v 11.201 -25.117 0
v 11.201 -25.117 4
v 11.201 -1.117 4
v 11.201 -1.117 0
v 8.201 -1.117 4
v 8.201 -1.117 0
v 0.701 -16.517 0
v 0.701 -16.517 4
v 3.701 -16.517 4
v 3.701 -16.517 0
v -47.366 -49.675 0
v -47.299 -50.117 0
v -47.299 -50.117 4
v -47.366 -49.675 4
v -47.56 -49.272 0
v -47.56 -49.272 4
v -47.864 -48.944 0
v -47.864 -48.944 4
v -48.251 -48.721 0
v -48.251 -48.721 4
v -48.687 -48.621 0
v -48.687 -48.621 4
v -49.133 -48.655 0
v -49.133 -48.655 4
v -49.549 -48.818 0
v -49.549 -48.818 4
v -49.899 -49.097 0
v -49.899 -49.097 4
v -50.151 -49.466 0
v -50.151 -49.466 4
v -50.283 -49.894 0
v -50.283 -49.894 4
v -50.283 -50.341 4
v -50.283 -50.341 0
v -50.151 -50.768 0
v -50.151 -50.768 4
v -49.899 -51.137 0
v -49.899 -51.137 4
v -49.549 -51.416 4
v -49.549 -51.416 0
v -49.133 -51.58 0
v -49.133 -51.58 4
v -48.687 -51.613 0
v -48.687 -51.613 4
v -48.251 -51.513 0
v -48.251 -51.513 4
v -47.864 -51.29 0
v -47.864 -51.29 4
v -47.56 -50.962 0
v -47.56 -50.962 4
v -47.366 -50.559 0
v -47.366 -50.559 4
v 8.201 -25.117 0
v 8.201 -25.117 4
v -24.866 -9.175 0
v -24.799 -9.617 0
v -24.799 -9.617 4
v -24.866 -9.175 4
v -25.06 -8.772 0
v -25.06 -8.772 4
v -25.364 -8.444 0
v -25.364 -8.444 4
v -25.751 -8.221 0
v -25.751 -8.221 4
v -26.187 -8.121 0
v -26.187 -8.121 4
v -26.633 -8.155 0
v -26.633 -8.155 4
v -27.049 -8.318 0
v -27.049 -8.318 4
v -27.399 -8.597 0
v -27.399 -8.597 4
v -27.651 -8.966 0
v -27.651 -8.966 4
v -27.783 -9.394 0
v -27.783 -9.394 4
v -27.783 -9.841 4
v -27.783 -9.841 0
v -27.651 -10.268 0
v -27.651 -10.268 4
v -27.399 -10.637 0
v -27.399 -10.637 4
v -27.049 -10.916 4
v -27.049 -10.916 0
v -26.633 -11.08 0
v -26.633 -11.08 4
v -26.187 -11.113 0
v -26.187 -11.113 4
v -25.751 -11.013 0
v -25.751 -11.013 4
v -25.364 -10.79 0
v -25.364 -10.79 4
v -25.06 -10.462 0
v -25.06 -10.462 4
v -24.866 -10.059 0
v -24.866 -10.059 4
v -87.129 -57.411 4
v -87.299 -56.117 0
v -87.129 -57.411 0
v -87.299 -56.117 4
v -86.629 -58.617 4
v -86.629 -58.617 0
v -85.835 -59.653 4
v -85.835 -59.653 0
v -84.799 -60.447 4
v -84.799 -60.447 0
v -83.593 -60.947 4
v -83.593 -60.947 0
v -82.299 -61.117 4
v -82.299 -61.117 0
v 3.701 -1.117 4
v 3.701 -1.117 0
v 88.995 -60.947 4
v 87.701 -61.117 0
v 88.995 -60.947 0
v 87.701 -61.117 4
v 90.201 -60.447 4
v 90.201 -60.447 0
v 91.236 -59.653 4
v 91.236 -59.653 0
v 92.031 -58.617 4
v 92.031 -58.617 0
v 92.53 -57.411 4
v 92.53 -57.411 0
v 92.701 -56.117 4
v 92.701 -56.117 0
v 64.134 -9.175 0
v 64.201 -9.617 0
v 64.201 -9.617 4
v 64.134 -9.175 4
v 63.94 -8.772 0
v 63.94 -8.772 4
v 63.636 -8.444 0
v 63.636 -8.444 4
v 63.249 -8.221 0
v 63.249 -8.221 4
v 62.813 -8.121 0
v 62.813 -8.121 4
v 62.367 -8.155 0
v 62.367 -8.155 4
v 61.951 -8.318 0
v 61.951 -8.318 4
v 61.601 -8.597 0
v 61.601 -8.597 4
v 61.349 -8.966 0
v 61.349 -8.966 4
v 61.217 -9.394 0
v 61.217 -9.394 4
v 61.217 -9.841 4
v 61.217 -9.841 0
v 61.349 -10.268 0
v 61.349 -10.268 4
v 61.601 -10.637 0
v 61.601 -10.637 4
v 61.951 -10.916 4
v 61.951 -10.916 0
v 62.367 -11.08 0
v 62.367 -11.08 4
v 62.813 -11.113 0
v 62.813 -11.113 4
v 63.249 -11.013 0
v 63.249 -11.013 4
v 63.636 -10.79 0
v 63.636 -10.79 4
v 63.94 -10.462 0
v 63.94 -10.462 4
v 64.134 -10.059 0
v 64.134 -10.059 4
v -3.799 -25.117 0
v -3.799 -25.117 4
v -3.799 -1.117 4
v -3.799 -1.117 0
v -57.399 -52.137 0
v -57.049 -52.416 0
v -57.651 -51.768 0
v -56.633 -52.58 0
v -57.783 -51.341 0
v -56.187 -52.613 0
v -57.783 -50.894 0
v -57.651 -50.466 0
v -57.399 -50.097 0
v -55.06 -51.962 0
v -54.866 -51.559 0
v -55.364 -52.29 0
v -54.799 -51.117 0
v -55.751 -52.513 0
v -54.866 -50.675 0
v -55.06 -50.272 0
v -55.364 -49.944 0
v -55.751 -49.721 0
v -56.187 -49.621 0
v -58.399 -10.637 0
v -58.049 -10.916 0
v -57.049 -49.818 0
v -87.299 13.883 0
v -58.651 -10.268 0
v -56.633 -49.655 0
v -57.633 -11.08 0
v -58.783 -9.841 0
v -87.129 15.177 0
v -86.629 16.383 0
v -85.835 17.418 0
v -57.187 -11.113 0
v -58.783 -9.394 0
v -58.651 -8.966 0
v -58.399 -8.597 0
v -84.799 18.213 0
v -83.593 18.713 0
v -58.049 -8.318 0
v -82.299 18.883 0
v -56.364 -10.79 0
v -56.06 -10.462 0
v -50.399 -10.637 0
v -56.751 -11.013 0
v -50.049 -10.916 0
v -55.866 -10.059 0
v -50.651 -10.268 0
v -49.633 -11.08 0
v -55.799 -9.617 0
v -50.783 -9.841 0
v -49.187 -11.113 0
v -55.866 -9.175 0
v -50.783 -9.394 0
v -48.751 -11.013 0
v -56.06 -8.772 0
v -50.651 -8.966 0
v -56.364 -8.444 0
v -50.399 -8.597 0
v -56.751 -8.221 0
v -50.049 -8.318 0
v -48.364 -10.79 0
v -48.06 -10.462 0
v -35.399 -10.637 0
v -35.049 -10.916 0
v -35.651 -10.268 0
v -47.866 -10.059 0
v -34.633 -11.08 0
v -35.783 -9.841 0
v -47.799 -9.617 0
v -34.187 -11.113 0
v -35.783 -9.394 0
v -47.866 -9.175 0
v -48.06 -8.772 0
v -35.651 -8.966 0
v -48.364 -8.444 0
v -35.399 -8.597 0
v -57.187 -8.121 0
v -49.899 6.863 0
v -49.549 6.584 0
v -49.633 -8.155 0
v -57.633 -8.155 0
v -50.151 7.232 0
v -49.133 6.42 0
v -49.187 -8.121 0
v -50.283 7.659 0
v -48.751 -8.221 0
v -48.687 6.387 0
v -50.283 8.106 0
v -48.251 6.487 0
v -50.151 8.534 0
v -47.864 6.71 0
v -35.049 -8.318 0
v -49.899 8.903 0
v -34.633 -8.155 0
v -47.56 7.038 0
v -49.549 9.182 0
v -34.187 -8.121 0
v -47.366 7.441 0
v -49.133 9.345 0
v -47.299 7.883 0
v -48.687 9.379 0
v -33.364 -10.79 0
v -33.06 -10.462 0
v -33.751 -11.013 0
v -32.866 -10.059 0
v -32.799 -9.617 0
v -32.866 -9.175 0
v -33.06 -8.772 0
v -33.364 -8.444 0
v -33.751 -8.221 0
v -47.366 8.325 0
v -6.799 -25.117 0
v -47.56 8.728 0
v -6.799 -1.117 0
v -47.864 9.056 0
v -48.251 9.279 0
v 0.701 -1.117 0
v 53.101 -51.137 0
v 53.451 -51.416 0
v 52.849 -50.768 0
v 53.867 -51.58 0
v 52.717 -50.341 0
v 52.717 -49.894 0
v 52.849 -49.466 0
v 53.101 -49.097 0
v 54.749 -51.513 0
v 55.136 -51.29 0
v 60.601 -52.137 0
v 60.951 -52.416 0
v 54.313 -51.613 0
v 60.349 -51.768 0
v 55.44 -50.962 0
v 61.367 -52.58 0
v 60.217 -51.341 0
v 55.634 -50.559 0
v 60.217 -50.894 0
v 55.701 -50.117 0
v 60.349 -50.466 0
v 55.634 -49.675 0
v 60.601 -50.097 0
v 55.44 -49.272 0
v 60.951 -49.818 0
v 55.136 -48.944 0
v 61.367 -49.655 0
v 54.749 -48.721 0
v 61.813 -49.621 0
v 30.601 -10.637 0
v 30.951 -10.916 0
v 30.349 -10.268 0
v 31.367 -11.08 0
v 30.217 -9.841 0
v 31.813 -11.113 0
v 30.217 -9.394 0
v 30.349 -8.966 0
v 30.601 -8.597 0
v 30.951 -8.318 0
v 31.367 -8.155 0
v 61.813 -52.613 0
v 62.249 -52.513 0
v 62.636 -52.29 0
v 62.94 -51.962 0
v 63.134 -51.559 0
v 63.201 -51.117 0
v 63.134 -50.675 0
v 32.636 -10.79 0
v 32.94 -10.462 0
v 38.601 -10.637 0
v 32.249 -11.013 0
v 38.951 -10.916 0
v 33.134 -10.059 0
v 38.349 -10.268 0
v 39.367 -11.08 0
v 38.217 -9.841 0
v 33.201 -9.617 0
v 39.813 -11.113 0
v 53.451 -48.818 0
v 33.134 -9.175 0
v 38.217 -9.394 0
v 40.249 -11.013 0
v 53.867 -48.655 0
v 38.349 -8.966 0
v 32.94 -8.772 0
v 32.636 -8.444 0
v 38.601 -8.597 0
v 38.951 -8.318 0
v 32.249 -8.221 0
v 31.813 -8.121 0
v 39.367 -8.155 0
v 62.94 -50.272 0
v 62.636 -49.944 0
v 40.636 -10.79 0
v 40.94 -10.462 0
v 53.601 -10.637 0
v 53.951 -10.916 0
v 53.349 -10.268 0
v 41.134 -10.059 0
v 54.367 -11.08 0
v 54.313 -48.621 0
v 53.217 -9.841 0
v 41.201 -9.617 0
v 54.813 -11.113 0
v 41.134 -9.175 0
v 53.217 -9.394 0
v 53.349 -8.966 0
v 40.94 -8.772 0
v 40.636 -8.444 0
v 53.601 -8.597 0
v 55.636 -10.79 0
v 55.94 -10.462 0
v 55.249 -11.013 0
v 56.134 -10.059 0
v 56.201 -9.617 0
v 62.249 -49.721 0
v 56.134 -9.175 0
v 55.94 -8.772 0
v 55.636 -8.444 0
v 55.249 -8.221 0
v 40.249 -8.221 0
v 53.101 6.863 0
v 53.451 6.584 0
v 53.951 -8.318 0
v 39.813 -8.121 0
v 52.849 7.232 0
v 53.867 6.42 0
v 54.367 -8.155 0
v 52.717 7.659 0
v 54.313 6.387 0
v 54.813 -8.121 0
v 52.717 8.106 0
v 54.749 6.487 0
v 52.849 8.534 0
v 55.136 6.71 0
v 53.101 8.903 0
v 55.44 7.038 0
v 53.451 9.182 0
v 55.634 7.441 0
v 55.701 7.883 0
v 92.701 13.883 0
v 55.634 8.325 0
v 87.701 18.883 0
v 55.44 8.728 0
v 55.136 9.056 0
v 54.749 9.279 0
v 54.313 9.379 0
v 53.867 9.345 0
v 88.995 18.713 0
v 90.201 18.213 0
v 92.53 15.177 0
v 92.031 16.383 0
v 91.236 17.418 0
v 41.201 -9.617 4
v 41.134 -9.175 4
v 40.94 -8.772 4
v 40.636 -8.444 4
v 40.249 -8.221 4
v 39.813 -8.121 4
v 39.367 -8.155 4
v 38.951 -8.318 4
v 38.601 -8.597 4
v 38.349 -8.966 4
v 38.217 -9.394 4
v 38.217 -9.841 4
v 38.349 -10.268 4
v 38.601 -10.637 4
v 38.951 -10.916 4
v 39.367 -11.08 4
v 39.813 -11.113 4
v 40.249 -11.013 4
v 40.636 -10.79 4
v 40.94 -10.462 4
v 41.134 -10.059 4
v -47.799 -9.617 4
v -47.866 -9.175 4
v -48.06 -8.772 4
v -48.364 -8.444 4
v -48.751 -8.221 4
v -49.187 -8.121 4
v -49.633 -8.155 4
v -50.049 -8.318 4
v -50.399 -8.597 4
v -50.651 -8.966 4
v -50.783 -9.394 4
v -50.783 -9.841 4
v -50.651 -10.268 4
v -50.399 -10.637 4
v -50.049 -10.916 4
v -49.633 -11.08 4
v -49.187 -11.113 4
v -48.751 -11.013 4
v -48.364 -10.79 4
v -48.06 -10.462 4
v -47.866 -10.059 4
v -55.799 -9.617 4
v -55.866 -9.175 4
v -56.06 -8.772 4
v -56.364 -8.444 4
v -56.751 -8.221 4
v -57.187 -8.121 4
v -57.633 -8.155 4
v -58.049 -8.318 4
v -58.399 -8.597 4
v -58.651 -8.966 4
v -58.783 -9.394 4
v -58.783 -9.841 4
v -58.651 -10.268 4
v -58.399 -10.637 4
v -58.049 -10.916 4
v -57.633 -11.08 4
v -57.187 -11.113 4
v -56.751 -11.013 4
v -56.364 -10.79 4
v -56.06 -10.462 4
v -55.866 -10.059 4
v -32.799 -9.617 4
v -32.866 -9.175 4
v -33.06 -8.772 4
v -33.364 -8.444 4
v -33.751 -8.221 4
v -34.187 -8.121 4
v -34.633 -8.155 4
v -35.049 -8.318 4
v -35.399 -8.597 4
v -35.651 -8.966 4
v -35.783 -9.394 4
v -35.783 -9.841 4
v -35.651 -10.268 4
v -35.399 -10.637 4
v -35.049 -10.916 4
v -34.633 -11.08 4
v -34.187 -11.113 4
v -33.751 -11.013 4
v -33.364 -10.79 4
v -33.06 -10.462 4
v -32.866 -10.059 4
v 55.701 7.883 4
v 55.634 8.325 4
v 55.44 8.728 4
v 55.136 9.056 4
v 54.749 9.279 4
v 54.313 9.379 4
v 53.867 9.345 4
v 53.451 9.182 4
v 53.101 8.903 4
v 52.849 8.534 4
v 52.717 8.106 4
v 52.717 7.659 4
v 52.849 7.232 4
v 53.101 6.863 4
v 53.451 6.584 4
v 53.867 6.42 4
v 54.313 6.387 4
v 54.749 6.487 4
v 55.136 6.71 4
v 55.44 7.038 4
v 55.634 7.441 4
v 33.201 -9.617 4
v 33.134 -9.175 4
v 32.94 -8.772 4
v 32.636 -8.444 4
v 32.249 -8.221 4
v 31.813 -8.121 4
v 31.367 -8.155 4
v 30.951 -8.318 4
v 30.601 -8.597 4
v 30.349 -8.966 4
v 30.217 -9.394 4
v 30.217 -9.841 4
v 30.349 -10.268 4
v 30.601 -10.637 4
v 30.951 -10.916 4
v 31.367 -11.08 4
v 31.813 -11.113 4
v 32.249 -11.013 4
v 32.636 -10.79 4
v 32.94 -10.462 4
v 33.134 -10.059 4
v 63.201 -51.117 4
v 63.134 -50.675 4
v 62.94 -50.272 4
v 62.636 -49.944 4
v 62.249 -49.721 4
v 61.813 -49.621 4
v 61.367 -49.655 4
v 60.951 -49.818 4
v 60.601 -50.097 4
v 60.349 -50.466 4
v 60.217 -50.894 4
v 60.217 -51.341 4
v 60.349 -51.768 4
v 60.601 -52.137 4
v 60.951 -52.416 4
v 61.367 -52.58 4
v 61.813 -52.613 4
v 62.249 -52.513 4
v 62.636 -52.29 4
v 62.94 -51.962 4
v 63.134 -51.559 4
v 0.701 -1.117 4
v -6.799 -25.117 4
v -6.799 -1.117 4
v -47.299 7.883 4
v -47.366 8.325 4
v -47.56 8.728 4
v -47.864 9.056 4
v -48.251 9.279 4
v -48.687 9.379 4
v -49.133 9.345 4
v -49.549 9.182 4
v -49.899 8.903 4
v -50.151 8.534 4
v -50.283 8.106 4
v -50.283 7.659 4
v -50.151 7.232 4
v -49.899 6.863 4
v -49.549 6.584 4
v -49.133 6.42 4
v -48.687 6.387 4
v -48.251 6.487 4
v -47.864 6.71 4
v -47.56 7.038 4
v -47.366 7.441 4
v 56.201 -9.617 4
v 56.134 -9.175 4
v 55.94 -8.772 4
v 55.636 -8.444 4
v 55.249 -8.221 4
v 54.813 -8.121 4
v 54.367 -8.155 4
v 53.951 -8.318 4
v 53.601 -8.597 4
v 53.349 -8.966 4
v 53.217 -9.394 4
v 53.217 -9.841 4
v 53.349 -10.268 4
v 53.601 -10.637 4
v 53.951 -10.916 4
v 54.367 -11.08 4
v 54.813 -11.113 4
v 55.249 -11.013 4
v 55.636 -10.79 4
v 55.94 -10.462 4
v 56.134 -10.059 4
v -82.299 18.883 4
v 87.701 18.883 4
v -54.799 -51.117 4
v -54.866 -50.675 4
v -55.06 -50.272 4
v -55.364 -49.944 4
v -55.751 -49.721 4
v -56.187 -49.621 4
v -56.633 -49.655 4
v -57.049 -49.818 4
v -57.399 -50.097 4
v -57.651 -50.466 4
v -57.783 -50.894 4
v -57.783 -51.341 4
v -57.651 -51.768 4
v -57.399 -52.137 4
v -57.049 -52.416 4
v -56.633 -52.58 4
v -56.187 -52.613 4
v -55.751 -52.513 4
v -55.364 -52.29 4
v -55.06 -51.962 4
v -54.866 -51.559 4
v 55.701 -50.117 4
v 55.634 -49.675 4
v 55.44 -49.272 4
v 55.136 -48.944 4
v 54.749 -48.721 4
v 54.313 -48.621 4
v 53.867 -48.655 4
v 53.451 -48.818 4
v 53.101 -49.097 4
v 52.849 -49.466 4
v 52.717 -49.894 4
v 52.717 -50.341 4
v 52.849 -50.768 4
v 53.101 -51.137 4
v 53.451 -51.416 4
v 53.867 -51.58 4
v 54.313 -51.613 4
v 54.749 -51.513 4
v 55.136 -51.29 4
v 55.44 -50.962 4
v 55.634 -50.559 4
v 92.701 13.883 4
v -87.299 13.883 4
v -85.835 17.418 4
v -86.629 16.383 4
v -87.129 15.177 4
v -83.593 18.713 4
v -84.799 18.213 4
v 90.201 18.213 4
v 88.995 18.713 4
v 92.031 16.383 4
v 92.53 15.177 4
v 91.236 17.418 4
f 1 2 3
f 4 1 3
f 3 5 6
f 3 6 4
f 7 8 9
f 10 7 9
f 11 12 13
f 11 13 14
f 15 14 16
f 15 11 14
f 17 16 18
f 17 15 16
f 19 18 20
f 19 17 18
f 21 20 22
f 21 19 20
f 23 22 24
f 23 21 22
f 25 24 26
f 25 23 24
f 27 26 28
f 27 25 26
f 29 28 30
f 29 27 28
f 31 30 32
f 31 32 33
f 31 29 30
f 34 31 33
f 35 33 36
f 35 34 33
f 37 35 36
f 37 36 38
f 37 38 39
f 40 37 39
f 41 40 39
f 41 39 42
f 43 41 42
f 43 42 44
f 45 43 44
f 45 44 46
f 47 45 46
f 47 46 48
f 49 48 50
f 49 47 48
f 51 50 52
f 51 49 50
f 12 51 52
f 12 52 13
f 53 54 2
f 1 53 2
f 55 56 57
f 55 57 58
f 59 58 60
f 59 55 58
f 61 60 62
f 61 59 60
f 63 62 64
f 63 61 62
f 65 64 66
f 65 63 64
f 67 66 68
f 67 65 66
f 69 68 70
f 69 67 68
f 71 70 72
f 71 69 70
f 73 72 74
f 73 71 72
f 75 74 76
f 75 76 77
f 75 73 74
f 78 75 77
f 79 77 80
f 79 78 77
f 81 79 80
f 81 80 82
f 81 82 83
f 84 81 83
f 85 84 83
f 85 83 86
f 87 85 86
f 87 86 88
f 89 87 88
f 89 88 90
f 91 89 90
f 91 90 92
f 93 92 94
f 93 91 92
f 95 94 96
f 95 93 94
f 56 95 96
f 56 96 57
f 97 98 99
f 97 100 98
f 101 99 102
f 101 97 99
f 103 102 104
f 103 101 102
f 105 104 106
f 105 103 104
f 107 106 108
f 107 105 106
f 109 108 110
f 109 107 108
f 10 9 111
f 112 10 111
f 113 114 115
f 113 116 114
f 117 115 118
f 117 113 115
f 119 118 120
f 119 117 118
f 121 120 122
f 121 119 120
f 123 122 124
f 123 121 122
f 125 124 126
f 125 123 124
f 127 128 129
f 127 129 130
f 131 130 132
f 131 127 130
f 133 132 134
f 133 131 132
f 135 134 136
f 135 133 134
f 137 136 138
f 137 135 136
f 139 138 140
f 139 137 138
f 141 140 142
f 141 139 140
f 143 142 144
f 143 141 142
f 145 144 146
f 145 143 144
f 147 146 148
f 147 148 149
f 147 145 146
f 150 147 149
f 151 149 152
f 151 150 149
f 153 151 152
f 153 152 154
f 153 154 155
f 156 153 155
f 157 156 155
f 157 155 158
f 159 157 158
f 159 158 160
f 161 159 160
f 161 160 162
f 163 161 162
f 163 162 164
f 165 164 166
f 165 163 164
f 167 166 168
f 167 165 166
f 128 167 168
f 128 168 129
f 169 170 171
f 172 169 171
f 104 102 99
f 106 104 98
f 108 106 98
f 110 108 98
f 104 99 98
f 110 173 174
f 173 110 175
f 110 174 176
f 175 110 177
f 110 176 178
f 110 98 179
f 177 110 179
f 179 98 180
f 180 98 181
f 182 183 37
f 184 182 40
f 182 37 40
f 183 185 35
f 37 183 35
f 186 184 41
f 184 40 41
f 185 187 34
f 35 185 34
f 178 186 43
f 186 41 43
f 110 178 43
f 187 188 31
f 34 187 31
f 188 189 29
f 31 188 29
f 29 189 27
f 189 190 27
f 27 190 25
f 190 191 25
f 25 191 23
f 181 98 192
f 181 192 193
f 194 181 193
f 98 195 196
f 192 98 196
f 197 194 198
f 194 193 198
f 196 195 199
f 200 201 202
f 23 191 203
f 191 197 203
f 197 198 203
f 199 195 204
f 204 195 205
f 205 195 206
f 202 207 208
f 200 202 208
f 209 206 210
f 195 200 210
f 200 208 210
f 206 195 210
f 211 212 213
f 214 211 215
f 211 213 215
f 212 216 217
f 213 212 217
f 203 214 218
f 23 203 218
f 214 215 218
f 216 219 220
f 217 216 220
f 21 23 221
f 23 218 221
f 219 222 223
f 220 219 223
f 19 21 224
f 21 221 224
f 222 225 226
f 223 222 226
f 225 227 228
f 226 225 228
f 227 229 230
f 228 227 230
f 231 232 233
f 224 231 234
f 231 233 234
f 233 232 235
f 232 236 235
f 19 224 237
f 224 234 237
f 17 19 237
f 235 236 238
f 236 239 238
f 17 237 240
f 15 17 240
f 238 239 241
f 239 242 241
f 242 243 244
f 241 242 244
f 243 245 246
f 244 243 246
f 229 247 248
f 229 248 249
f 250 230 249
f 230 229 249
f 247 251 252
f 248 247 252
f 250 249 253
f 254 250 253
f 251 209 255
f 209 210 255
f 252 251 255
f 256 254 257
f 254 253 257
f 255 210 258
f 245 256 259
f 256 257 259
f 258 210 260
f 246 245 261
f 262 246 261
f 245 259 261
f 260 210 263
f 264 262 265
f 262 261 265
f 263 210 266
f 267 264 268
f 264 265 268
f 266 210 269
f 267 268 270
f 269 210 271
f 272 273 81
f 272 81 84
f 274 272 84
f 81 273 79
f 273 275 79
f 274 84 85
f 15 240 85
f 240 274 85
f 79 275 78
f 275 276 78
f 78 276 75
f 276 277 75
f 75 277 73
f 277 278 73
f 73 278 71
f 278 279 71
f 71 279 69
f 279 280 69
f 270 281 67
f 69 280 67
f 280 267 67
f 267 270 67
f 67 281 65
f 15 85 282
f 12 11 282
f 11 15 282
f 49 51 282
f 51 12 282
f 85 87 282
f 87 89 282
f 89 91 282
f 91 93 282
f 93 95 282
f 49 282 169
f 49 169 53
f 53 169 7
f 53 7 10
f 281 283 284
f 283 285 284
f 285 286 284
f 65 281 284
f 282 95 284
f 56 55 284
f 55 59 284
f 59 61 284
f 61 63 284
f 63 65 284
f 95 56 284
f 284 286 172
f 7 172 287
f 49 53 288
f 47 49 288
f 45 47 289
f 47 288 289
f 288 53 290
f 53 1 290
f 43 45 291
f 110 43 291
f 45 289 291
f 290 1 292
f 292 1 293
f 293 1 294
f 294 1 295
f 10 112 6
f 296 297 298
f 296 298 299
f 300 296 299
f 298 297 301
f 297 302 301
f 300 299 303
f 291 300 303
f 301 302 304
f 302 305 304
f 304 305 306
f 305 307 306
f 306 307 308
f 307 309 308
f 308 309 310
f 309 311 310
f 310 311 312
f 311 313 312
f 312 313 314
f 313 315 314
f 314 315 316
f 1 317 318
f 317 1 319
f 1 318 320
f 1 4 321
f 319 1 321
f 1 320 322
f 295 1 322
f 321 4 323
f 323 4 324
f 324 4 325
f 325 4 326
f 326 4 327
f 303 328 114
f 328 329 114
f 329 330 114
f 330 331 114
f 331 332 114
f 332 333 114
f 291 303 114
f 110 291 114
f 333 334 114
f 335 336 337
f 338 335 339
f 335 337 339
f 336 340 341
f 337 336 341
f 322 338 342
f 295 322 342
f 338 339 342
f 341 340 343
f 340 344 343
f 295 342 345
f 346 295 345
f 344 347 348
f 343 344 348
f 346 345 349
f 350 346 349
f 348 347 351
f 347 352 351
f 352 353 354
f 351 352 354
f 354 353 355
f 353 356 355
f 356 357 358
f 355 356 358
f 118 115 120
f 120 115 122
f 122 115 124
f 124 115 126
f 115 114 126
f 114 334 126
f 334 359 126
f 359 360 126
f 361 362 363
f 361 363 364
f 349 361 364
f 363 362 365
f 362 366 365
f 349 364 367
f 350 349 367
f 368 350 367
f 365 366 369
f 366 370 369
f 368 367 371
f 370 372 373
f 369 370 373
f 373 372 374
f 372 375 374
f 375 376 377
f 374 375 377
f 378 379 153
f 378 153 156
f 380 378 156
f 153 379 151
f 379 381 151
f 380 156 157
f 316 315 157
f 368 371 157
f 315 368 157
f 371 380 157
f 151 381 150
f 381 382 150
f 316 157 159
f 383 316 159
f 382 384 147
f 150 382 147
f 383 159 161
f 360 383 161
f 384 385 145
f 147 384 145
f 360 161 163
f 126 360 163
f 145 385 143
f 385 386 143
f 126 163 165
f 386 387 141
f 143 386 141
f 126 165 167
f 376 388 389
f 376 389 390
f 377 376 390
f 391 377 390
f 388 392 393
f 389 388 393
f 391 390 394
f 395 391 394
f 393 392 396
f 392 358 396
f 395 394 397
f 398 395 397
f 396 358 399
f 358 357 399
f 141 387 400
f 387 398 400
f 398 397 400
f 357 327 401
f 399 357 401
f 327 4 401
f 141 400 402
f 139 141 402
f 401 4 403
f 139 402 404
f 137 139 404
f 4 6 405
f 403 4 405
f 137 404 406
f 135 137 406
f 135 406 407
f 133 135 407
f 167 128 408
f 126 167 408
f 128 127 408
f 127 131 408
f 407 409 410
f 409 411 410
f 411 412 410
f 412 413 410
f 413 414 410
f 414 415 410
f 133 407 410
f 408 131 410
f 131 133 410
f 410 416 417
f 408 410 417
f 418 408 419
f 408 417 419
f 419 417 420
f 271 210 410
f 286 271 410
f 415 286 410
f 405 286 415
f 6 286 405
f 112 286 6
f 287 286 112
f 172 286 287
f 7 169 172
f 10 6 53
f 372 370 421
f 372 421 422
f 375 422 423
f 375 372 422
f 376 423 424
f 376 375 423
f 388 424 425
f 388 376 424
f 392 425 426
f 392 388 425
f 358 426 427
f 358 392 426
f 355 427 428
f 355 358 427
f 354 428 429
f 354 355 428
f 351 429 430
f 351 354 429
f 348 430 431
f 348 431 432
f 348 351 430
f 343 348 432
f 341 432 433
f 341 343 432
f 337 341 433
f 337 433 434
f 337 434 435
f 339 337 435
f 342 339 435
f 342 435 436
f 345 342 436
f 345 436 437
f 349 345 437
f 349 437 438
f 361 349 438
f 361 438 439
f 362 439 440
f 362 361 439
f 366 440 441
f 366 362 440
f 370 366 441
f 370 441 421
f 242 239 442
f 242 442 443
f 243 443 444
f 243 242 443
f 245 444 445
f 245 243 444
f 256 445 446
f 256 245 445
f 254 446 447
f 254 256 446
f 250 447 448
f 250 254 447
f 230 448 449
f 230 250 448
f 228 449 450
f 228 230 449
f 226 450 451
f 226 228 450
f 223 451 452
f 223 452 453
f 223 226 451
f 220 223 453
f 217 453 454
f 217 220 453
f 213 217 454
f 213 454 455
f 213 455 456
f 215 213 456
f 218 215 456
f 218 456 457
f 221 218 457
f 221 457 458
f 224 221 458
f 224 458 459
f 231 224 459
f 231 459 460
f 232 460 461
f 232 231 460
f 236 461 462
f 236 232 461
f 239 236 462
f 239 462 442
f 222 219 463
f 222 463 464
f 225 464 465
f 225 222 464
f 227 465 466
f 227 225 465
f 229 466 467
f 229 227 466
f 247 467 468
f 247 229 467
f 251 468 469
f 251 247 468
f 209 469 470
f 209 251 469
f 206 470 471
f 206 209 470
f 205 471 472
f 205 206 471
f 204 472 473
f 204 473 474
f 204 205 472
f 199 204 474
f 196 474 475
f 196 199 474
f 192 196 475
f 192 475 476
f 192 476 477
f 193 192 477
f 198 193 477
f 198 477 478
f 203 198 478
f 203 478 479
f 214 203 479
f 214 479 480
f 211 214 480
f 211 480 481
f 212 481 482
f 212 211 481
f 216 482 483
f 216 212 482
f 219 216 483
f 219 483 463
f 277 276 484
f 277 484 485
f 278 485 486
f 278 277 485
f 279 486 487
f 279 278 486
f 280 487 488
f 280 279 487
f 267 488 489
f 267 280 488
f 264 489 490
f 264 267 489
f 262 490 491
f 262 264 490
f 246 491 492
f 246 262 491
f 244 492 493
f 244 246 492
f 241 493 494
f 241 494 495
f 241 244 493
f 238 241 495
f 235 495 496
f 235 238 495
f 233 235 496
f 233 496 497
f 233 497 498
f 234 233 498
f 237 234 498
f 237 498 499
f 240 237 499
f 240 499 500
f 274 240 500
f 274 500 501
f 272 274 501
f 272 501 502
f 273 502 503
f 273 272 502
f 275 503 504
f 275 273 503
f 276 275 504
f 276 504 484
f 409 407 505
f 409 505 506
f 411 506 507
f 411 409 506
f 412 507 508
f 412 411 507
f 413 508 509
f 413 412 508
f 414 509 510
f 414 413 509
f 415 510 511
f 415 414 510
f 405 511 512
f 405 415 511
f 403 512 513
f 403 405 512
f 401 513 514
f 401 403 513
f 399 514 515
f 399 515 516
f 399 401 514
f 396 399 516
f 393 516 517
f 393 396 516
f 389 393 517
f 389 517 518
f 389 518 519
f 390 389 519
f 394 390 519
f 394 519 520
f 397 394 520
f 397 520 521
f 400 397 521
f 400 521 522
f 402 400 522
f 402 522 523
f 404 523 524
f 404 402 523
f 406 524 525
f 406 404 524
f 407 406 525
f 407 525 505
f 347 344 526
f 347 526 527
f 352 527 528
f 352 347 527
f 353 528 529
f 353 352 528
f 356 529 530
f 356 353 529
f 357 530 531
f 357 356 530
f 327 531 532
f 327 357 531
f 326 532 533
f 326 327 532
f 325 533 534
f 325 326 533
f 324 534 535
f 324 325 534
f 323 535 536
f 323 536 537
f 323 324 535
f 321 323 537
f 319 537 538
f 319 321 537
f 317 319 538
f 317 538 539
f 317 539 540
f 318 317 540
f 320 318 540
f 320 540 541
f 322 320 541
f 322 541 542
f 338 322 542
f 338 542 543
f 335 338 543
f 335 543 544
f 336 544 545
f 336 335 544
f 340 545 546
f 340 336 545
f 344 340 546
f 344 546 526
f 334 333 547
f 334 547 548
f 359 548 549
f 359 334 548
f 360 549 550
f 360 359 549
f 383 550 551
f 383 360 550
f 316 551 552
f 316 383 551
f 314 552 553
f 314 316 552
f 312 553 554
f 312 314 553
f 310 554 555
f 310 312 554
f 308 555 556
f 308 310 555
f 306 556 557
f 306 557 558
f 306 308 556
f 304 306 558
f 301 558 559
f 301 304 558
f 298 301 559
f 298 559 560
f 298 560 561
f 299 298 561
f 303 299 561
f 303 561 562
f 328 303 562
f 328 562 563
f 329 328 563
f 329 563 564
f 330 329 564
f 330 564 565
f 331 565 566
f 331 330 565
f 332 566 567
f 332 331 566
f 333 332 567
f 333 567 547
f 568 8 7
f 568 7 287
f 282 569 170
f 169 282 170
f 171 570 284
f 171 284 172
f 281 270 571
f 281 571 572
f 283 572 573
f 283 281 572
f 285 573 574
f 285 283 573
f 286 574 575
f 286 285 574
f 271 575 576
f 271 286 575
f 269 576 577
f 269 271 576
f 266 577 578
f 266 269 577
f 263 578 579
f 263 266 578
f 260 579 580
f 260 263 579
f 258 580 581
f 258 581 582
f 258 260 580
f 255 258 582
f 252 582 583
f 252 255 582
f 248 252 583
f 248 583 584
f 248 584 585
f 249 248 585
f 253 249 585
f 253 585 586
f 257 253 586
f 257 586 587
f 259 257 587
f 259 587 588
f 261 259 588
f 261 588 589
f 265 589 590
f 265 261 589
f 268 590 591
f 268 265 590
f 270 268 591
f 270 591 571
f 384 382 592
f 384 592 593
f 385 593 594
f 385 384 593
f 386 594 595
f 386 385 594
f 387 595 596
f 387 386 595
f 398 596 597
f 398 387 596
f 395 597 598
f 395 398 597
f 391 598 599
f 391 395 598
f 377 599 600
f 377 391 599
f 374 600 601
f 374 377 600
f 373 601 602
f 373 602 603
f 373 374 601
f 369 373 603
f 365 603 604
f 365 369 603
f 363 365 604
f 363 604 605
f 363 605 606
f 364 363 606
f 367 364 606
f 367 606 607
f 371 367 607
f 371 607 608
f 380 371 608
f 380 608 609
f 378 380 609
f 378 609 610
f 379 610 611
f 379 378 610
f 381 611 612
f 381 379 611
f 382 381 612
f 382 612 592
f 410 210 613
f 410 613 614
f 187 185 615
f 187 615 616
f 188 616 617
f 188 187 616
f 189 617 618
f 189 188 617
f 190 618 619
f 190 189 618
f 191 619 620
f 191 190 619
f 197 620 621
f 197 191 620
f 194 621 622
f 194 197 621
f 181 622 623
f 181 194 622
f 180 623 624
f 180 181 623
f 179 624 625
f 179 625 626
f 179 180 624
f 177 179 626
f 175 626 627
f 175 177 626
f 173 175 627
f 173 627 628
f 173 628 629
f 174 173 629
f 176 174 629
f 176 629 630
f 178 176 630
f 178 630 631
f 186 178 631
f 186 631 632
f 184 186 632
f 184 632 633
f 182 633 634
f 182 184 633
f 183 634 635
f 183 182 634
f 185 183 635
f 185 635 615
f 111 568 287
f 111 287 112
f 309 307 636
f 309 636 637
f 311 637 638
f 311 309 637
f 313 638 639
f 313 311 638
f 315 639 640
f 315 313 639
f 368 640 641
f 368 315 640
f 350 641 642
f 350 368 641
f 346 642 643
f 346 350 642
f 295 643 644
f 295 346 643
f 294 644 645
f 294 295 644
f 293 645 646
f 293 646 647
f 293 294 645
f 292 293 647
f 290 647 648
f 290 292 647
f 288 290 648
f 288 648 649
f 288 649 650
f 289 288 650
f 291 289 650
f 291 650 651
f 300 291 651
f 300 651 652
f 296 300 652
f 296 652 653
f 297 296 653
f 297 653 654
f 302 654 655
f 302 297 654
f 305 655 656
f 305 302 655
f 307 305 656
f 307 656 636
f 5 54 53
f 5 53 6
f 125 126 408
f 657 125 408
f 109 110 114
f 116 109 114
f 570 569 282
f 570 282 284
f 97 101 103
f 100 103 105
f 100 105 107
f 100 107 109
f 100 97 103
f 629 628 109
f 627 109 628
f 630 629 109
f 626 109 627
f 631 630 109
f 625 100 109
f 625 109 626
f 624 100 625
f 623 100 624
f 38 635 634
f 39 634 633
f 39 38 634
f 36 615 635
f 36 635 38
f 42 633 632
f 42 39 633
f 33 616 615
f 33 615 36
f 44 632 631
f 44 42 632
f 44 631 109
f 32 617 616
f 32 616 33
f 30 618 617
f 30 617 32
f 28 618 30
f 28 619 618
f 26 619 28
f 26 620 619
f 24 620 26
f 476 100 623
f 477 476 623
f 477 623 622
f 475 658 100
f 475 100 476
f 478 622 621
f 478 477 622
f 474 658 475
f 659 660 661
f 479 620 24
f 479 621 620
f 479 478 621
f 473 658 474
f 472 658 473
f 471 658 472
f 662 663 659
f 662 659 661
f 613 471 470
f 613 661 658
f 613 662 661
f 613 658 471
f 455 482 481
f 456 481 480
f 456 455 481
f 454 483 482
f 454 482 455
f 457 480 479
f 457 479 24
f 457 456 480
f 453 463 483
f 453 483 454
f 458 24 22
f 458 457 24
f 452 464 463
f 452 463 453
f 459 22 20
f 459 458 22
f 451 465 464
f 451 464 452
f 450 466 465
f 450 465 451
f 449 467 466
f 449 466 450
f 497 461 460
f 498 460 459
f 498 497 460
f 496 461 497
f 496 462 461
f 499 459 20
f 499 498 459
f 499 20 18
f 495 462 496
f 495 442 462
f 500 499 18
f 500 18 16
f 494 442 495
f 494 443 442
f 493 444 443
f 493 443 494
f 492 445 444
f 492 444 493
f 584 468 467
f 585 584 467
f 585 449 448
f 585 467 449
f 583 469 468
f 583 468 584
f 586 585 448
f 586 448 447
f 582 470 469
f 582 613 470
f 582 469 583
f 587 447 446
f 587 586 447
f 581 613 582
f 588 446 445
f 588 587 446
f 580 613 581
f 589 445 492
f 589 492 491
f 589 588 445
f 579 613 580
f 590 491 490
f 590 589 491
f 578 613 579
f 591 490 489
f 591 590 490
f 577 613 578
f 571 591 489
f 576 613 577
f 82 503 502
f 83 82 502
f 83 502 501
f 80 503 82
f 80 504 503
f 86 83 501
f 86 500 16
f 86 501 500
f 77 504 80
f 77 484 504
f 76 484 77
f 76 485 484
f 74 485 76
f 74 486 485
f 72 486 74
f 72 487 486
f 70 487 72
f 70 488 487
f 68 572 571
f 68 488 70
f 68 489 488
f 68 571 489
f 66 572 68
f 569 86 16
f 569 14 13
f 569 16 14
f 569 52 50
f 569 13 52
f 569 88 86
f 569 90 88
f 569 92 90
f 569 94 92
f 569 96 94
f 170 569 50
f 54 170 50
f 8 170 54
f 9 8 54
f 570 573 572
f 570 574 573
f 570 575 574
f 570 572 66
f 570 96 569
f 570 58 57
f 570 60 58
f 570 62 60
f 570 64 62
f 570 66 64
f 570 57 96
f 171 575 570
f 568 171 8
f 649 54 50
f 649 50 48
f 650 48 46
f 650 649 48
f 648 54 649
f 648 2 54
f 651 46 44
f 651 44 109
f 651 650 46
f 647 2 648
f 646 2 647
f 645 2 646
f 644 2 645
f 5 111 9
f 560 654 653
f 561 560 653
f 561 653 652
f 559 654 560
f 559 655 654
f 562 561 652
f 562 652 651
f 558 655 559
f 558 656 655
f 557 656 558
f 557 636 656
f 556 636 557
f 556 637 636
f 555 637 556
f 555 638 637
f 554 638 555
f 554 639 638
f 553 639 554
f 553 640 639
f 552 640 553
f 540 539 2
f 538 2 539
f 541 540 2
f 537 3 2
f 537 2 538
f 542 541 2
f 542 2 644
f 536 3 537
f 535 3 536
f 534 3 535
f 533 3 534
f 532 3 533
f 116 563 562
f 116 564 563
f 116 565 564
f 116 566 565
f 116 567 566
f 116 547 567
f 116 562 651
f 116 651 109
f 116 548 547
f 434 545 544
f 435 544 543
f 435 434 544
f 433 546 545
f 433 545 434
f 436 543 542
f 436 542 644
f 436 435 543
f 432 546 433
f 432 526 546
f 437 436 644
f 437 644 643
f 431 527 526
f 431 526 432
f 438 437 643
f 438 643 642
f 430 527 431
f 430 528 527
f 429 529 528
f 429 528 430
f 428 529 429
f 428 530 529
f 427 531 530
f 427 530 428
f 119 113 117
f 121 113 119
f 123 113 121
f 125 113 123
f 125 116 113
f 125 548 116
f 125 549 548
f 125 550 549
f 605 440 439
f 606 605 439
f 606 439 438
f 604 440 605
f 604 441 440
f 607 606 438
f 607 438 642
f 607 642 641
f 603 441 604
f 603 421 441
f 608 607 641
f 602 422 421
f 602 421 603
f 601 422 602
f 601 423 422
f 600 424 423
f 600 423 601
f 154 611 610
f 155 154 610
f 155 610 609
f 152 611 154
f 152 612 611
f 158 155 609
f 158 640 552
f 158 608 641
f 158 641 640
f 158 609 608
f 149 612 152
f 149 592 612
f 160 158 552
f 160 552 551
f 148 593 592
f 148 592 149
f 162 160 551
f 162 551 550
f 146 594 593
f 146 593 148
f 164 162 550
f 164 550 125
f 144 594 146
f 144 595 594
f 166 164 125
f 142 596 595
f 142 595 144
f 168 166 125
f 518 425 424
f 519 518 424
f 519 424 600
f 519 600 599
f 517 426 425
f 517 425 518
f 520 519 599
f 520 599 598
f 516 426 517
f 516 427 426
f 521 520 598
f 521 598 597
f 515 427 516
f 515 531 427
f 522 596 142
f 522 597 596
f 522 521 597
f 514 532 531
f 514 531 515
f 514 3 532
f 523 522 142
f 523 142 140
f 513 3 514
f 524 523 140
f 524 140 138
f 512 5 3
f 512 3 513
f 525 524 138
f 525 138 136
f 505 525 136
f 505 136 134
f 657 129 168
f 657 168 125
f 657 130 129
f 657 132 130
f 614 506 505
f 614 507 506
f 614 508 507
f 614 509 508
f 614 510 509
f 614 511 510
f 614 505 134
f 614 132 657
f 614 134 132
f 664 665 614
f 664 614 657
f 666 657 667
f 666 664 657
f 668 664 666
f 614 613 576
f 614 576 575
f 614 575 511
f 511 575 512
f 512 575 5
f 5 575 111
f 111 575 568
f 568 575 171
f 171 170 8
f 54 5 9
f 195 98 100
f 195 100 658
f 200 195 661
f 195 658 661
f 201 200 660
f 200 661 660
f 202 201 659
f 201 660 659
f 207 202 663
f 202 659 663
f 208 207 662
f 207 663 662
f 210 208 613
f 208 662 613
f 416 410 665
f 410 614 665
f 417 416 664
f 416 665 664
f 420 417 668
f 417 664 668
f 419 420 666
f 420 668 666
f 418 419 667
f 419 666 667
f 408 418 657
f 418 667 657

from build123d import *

# Parameters (mm, degrees)
SKETCH1_W           = 180
SKETCH1_H           = 80
SKETCH1_R           = 1.5
BOSS_EXTRUDE1_DEPTH = 4
SKETCH2_W           = 3
SKETCH2_H           = 24
SKETCH2_H_2         = 15.4
CUT_EXTRUDE1_DEPTH  = 4
FILLET1_R           = 5


with BuildPart() as part:
    # Sketch1 → Boss-Extrude1 (new body)
    with BuildSketch(Plane.XY):
        with Locations((2.700642055, -21.117125984)):
            Rectangle(SKETCH1_W, SKETCH1_H)
        with Locations((-57.299357945, -9.617125984)):
            Circle(SKETCH1_R, mode=Mode.SUBTRACT)
        with Locations((62.700642055, -9.617125984)):
            Circle(SKETCH1_R, mode=Mode.SUBTRACT)
        with Locations((61.700642055, -51.117125984)):
            Circle(SKETCH1_R, mode=Mode.SUBTRACT)
        with Locations((-56.299357945, -51.117125984)):
            Circle(SKETCH1_R, mode=Mode.SUBTRACT)
        with Locations((-49.299357945, -9.617125984)):
            Circle(SKETCH1_R, mode=Mode.SUBTRACT)
        with Locations((54.700642055, -9.617125984)):
            Circle(SKETCH1_R, mode=Mode.SUBTRACT)
        with Locations((-34.299357945, -9.617125984)):
            Circle(SKETCH1_R, mode=Mode.SUBTRACT)
        with Locations((-26.299357945, -9.617125984)):
            Circle(SKETCH1_R, mode=Mode.SUBTRACT)
        with Locations((39.700642055, -9.617125984)):
            Circle(SKETCH1_R, mode=Mode.SUBTRACT)
        with Locations((31.700642055, -9.617125984)):
            Circle(SKETCH1_R, mode=Mode.SUBTRACT)
        with Locations((-48.799357945, 7.882874016)):
            Circle(SKETCH1_R, mode=Mode.SUBTRACT)
        with Locations((54.200642055, 7.882874016)):
            Circle(SKETCH1_R, mode=Mode.SUBTRACT)
        with Locations((54.200642055, -50.117125984)):
            Circle(SKETCH1_R, mode=Mode.SUBTRACT)
        with Locations((-48.799357945, -50.117125984)):
            Circle(SKETCH1_R, mode=Mode.SUBTRACT)
    extrude(amount=BOSS_EXTRUDE1_DEPTH)

    # Sketch2 → Cut-Extrude1 (cut)
    with BuildSketch(Plane.XY.offset(4)):
        with Locations((-5.299357945, -13.117125984)):
            Rectangle(SKETCH2_W, SKETCH2_H)
        with Locations((2.200642055, -8.817125984)):
            Rectangle(SKETCH2_W, SKETCH2_H_2)
        with Locations((9.700642055, -13.117125984)):
            Rectangle(SKETCH2_W, SKETCH2_H)
    extrude(amount=-CUT_EXTRUDE1_DEPTH, mode=Mode.SUBTRACT)

    # Fillet1
    fillet1_edges = [part.edges().sort_by_distance(p)[0] for p in [
        (-87.299357945, 18.882874016, 2),
        (92.700642055, 18.882874016, 2),
        (92.700642055, -61.117125984, 2),
        (-87.299357945, -61.117125984, 2),
    ]]
    fillet(fillet1_edges, radius=FILLET1_R)


solid = part.part
